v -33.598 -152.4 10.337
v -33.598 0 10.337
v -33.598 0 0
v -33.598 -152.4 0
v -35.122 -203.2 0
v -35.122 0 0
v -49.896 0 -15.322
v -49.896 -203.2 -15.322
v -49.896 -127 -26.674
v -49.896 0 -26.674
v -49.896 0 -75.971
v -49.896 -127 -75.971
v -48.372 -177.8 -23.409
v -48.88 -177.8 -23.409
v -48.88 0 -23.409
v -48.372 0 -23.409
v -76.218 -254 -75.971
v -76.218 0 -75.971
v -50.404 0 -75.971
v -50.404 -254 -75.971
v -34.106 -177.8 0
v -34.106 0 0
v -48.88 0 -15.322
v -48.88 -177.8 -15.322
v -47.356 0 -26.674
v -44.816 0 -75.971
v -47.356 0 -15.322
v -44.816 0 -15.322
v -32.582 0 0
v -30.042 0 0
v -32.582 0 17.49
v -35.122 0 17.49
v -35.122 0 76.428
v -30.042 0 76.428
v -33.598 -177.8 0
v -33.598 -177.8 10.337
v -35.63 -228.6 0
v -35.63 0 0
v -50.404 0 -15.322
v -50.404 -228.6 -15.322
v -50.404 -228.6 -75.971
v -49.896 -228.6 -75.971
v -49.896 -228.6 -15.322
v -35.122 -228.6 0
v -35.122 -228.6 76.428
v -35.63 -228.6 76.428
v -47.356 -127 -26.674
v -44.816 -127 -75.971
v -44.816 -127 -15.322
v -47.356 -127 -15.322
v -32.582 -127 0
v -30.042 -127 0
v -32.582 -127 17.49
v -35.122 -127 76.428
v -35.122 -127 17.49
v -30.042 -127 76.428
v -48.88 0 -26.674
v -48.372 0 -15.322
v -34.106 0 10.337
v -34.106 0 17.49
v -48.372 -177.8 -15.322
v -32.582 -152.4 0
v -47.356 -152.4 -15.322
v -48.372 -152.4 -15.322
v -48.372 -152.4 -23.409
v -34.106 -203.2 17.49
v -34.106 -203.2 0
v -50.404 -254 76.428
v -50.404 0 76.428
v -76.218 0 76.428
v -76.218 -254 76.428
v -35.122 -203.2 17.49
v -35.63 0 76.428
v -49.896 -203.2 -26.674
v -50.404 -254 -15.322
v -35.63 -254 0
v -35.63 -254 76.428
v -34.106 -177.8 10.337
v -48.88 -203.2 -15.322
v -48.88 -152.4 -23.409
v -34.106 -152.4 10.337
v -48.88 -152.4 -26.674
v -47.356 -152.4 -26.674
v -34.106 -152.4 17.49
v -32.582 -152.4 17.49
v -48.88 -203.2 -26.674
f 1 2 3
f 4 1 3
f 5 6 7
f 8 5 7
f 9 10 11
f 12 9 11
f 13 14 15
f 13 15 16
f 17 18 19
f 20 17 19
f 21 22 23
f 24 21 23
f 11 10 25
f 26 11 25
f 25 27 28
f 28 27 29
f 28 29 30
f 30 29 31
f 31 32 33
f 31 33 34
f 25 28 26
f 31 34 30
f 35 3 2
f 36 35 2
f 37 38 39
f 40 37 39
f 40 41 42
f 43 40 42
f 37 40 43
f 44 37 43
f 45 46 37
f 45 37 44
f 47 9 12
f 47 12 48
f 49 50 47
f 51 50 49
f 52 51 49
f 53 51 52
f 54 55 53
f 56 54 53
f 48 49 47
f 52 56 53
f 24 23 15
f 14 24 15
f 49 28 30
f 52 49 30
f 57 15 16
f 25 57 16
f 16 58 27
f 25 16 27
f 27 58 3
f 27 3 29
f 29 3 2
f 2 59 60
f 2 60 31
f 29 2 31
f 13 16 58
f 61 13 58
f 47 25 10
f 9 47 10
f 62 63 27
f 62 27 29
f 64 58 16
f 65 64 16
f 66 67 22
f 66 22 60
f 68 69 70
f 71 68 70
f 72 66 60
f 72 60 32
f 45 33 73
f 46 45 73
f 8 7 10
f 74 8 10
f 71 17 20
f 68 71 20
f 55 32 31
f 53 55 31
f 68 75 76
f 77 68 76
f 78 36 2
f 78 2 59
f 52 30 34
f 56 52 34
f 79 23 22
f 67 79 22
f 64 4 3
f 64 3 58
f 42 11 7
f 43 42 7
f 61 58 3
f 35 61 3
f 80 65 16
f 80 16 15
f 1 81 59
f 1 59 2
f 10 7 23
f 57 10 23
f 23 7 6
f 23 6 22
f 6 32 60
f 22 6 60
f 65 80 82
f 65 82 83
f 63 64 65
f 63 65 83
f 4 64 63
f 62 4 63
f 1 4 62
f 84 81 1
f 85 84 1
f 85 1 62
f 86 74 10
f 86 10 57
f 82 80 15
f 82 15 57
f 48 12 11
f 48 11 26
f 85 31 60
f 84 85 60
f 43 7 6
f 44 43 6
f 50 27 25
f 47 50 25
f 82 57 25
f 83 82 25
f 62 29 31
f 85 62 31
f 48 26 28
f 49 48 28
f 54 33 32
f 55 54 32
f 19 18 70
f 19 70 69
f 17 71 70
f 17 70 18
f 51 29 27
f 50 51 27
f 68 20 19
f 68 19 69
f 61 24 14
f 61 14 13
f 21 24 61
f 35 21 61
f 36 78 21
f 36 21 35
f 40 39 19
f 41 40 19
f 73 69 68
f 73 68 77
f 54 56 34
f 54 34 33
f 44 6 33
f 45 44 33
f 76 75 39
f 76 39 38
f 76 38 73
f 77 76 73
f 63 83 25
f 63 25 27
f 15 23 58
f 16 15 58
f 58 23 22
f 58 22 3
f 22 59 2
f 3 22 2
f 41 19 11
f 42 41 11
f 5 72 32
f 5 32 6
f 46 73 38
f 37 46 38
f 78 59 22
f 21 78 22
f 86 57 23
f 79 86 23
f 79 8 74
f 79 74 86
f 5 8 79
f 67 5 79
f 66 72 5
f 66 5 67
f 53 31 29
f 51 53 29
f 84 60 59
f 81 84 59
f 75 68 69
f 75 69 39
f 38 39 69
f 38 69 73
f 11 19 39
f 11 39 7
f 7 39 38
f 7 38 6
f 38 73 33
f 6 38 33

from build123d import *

# Parameters (mm, degrees)
F1_DEPTH = 254
F0_W     = 14.7733949125
F0_H     = 76.4283165336
F2_DEPTH = 254
F3_DEPTH = 254
F4_DEPTH = 228.6
F5_DEPTH = 203.2
F6_DEPTH = 177.8
F7_DEPTH = 152.4
F8_DEPTH = 127


with BuildPart() as f1:
    # F0 (on Front) → F1 (new body)
    with BuildSketch(Plane.XZ):
        Polygon((-50.4037477076, 76.4283165336), (-76.2183219194, 76.4283165336), (-76.2183219194, -75.9709477425), (-50.4037477076, -75.9709477425), (-50.4037477076, -15.3222624213), (-50.4037477076, 0), align=None)
    extrude(amount=F1_DEPTH)


with BuildPart() as f2:
    # F0 (on Front) → F2 (new body)
    with BuildSketch(Plane.XZ):
        with Locations((-43.0170502514, 38.2141582668)):
            Rectangle(F0_W, F0_H)
    extrude(amount=F2_DEPTH)

    # F0 (on Front) → F3 (join)
    with BuildSketch(Plane.XZ):
        Polygon((-35.6303527951, 0), (-50.4037477076, 0), (-50.4037477076, -15.3222624213), align=None)
    extrude(amount=F3_DEPTH)


with BuildPart() as f4:
    # F0 (on Front) → F4 (new body)
    with BuildSketch(Plane.XZ):
        Polygon((-35.1223527951, 76.4283165336), (-35.6303527951, 76.4283165336), (-35.6303527951, 0), (-50.4037477076, -15.3222624213), (-50.4037477076, -75.9709477425), (-49.8957477076, -75.9709477425), (-49.8957477076, -26.6744550318), (-49.8957477076, -15.3222624213), (-35.1223527951, 0), (-35.1223527951, 17.490234226), align=None)
    extrude(amount=F4_DEPTH)


with BuildPart() as f5:
    # F0 (on Front) → F5 (new body)
    with BuildSketch(Plane.XZ):
        Polygon((-34.1063527951, 17.490234226), (-35.1223527951, 17.490234226), (-35.1223527951, 0), (-49.8957477076, -15.3222624213), (-49.8957477076, -26.6744550318), (-48.8797477076, -26.6744550318), (-48.8797477076, -23.4087556601), (-48.8797477076, -15.3222624213), (-34.1063527951, 0), (-34.1063527951, 10.3367986158), align=None)
    extrude(amount=F5_DEPTH)


with BuildPart() as f6:
    # F0 (on Front) → F6 (new body)
    with BuildSketch(Plane.XZ):
        Polygon((-33.5983527951, 10.3367986158), (-34.1063527951, 10.3367986158), (-34.1063527951, 0), (-48.8797477076, -15.3222624213), (-48.8797477076, -23.4087556601), (-48.3717477076, -23.4087556601), (-48.3717477076, -15.3222624213), (-33.5983527951, 0), align=None)
    extrude(amount=F6_DEPTH)


with BuildPart() as f7:
    # F0 (on Front) → F7 (new body)
    with BuildSketch(Plane.XZ):
        Polygon((-32.5823527951, 17.490234226), (-34.1063527951, 17.490234226), (-34.1063527951, 10.3367986158), (-33.5983527951, 10.3367986158), (-33.5983527951, 0), (-48.3717477076, -15.3222624213), (-48.3717477076, -23.4087556601), (-48.8797477076, -23.4087556601), (-48.8797477076, -26.6744550318), (-47.3557477076, -26.6744550318), (-47.3557477076, -15.3222624213), (-32.5823527951, 0), align=None)
    extrude(amount=F7_DEPTH)


with BuildPart() as f8:
    # F0 (on Front) → F8 (new body)
    with BuildSketch(Plane.XZ):
        Polygon((-30.0423527951, 76.4283165336), (-35.1223527951, 76.4283165336), (-35.1223527951, 17.490234226), (-34.1063527951, 17.490234226), (-32.5823527951, 17.490234226), (-32.5823527951, 0), (-47.3557477076, -15.3222624213), (-47.3557477076, -26.6744550318), (-48.8797477076, -26.6744550318), (-49.8957477076, -26.6744550318), (-49.8957477076, -75.9709477425), (-44.8157477076, -75.9709477425), (-44.8157477076, -15.3222624213), (-30.0423527951, 0), align=None)
    extrude(amount=F8_DEPTH)


solid = Compound([f1.part, f2.part, f4.part, f5.part, f6.part, f7.part, f8.part])
